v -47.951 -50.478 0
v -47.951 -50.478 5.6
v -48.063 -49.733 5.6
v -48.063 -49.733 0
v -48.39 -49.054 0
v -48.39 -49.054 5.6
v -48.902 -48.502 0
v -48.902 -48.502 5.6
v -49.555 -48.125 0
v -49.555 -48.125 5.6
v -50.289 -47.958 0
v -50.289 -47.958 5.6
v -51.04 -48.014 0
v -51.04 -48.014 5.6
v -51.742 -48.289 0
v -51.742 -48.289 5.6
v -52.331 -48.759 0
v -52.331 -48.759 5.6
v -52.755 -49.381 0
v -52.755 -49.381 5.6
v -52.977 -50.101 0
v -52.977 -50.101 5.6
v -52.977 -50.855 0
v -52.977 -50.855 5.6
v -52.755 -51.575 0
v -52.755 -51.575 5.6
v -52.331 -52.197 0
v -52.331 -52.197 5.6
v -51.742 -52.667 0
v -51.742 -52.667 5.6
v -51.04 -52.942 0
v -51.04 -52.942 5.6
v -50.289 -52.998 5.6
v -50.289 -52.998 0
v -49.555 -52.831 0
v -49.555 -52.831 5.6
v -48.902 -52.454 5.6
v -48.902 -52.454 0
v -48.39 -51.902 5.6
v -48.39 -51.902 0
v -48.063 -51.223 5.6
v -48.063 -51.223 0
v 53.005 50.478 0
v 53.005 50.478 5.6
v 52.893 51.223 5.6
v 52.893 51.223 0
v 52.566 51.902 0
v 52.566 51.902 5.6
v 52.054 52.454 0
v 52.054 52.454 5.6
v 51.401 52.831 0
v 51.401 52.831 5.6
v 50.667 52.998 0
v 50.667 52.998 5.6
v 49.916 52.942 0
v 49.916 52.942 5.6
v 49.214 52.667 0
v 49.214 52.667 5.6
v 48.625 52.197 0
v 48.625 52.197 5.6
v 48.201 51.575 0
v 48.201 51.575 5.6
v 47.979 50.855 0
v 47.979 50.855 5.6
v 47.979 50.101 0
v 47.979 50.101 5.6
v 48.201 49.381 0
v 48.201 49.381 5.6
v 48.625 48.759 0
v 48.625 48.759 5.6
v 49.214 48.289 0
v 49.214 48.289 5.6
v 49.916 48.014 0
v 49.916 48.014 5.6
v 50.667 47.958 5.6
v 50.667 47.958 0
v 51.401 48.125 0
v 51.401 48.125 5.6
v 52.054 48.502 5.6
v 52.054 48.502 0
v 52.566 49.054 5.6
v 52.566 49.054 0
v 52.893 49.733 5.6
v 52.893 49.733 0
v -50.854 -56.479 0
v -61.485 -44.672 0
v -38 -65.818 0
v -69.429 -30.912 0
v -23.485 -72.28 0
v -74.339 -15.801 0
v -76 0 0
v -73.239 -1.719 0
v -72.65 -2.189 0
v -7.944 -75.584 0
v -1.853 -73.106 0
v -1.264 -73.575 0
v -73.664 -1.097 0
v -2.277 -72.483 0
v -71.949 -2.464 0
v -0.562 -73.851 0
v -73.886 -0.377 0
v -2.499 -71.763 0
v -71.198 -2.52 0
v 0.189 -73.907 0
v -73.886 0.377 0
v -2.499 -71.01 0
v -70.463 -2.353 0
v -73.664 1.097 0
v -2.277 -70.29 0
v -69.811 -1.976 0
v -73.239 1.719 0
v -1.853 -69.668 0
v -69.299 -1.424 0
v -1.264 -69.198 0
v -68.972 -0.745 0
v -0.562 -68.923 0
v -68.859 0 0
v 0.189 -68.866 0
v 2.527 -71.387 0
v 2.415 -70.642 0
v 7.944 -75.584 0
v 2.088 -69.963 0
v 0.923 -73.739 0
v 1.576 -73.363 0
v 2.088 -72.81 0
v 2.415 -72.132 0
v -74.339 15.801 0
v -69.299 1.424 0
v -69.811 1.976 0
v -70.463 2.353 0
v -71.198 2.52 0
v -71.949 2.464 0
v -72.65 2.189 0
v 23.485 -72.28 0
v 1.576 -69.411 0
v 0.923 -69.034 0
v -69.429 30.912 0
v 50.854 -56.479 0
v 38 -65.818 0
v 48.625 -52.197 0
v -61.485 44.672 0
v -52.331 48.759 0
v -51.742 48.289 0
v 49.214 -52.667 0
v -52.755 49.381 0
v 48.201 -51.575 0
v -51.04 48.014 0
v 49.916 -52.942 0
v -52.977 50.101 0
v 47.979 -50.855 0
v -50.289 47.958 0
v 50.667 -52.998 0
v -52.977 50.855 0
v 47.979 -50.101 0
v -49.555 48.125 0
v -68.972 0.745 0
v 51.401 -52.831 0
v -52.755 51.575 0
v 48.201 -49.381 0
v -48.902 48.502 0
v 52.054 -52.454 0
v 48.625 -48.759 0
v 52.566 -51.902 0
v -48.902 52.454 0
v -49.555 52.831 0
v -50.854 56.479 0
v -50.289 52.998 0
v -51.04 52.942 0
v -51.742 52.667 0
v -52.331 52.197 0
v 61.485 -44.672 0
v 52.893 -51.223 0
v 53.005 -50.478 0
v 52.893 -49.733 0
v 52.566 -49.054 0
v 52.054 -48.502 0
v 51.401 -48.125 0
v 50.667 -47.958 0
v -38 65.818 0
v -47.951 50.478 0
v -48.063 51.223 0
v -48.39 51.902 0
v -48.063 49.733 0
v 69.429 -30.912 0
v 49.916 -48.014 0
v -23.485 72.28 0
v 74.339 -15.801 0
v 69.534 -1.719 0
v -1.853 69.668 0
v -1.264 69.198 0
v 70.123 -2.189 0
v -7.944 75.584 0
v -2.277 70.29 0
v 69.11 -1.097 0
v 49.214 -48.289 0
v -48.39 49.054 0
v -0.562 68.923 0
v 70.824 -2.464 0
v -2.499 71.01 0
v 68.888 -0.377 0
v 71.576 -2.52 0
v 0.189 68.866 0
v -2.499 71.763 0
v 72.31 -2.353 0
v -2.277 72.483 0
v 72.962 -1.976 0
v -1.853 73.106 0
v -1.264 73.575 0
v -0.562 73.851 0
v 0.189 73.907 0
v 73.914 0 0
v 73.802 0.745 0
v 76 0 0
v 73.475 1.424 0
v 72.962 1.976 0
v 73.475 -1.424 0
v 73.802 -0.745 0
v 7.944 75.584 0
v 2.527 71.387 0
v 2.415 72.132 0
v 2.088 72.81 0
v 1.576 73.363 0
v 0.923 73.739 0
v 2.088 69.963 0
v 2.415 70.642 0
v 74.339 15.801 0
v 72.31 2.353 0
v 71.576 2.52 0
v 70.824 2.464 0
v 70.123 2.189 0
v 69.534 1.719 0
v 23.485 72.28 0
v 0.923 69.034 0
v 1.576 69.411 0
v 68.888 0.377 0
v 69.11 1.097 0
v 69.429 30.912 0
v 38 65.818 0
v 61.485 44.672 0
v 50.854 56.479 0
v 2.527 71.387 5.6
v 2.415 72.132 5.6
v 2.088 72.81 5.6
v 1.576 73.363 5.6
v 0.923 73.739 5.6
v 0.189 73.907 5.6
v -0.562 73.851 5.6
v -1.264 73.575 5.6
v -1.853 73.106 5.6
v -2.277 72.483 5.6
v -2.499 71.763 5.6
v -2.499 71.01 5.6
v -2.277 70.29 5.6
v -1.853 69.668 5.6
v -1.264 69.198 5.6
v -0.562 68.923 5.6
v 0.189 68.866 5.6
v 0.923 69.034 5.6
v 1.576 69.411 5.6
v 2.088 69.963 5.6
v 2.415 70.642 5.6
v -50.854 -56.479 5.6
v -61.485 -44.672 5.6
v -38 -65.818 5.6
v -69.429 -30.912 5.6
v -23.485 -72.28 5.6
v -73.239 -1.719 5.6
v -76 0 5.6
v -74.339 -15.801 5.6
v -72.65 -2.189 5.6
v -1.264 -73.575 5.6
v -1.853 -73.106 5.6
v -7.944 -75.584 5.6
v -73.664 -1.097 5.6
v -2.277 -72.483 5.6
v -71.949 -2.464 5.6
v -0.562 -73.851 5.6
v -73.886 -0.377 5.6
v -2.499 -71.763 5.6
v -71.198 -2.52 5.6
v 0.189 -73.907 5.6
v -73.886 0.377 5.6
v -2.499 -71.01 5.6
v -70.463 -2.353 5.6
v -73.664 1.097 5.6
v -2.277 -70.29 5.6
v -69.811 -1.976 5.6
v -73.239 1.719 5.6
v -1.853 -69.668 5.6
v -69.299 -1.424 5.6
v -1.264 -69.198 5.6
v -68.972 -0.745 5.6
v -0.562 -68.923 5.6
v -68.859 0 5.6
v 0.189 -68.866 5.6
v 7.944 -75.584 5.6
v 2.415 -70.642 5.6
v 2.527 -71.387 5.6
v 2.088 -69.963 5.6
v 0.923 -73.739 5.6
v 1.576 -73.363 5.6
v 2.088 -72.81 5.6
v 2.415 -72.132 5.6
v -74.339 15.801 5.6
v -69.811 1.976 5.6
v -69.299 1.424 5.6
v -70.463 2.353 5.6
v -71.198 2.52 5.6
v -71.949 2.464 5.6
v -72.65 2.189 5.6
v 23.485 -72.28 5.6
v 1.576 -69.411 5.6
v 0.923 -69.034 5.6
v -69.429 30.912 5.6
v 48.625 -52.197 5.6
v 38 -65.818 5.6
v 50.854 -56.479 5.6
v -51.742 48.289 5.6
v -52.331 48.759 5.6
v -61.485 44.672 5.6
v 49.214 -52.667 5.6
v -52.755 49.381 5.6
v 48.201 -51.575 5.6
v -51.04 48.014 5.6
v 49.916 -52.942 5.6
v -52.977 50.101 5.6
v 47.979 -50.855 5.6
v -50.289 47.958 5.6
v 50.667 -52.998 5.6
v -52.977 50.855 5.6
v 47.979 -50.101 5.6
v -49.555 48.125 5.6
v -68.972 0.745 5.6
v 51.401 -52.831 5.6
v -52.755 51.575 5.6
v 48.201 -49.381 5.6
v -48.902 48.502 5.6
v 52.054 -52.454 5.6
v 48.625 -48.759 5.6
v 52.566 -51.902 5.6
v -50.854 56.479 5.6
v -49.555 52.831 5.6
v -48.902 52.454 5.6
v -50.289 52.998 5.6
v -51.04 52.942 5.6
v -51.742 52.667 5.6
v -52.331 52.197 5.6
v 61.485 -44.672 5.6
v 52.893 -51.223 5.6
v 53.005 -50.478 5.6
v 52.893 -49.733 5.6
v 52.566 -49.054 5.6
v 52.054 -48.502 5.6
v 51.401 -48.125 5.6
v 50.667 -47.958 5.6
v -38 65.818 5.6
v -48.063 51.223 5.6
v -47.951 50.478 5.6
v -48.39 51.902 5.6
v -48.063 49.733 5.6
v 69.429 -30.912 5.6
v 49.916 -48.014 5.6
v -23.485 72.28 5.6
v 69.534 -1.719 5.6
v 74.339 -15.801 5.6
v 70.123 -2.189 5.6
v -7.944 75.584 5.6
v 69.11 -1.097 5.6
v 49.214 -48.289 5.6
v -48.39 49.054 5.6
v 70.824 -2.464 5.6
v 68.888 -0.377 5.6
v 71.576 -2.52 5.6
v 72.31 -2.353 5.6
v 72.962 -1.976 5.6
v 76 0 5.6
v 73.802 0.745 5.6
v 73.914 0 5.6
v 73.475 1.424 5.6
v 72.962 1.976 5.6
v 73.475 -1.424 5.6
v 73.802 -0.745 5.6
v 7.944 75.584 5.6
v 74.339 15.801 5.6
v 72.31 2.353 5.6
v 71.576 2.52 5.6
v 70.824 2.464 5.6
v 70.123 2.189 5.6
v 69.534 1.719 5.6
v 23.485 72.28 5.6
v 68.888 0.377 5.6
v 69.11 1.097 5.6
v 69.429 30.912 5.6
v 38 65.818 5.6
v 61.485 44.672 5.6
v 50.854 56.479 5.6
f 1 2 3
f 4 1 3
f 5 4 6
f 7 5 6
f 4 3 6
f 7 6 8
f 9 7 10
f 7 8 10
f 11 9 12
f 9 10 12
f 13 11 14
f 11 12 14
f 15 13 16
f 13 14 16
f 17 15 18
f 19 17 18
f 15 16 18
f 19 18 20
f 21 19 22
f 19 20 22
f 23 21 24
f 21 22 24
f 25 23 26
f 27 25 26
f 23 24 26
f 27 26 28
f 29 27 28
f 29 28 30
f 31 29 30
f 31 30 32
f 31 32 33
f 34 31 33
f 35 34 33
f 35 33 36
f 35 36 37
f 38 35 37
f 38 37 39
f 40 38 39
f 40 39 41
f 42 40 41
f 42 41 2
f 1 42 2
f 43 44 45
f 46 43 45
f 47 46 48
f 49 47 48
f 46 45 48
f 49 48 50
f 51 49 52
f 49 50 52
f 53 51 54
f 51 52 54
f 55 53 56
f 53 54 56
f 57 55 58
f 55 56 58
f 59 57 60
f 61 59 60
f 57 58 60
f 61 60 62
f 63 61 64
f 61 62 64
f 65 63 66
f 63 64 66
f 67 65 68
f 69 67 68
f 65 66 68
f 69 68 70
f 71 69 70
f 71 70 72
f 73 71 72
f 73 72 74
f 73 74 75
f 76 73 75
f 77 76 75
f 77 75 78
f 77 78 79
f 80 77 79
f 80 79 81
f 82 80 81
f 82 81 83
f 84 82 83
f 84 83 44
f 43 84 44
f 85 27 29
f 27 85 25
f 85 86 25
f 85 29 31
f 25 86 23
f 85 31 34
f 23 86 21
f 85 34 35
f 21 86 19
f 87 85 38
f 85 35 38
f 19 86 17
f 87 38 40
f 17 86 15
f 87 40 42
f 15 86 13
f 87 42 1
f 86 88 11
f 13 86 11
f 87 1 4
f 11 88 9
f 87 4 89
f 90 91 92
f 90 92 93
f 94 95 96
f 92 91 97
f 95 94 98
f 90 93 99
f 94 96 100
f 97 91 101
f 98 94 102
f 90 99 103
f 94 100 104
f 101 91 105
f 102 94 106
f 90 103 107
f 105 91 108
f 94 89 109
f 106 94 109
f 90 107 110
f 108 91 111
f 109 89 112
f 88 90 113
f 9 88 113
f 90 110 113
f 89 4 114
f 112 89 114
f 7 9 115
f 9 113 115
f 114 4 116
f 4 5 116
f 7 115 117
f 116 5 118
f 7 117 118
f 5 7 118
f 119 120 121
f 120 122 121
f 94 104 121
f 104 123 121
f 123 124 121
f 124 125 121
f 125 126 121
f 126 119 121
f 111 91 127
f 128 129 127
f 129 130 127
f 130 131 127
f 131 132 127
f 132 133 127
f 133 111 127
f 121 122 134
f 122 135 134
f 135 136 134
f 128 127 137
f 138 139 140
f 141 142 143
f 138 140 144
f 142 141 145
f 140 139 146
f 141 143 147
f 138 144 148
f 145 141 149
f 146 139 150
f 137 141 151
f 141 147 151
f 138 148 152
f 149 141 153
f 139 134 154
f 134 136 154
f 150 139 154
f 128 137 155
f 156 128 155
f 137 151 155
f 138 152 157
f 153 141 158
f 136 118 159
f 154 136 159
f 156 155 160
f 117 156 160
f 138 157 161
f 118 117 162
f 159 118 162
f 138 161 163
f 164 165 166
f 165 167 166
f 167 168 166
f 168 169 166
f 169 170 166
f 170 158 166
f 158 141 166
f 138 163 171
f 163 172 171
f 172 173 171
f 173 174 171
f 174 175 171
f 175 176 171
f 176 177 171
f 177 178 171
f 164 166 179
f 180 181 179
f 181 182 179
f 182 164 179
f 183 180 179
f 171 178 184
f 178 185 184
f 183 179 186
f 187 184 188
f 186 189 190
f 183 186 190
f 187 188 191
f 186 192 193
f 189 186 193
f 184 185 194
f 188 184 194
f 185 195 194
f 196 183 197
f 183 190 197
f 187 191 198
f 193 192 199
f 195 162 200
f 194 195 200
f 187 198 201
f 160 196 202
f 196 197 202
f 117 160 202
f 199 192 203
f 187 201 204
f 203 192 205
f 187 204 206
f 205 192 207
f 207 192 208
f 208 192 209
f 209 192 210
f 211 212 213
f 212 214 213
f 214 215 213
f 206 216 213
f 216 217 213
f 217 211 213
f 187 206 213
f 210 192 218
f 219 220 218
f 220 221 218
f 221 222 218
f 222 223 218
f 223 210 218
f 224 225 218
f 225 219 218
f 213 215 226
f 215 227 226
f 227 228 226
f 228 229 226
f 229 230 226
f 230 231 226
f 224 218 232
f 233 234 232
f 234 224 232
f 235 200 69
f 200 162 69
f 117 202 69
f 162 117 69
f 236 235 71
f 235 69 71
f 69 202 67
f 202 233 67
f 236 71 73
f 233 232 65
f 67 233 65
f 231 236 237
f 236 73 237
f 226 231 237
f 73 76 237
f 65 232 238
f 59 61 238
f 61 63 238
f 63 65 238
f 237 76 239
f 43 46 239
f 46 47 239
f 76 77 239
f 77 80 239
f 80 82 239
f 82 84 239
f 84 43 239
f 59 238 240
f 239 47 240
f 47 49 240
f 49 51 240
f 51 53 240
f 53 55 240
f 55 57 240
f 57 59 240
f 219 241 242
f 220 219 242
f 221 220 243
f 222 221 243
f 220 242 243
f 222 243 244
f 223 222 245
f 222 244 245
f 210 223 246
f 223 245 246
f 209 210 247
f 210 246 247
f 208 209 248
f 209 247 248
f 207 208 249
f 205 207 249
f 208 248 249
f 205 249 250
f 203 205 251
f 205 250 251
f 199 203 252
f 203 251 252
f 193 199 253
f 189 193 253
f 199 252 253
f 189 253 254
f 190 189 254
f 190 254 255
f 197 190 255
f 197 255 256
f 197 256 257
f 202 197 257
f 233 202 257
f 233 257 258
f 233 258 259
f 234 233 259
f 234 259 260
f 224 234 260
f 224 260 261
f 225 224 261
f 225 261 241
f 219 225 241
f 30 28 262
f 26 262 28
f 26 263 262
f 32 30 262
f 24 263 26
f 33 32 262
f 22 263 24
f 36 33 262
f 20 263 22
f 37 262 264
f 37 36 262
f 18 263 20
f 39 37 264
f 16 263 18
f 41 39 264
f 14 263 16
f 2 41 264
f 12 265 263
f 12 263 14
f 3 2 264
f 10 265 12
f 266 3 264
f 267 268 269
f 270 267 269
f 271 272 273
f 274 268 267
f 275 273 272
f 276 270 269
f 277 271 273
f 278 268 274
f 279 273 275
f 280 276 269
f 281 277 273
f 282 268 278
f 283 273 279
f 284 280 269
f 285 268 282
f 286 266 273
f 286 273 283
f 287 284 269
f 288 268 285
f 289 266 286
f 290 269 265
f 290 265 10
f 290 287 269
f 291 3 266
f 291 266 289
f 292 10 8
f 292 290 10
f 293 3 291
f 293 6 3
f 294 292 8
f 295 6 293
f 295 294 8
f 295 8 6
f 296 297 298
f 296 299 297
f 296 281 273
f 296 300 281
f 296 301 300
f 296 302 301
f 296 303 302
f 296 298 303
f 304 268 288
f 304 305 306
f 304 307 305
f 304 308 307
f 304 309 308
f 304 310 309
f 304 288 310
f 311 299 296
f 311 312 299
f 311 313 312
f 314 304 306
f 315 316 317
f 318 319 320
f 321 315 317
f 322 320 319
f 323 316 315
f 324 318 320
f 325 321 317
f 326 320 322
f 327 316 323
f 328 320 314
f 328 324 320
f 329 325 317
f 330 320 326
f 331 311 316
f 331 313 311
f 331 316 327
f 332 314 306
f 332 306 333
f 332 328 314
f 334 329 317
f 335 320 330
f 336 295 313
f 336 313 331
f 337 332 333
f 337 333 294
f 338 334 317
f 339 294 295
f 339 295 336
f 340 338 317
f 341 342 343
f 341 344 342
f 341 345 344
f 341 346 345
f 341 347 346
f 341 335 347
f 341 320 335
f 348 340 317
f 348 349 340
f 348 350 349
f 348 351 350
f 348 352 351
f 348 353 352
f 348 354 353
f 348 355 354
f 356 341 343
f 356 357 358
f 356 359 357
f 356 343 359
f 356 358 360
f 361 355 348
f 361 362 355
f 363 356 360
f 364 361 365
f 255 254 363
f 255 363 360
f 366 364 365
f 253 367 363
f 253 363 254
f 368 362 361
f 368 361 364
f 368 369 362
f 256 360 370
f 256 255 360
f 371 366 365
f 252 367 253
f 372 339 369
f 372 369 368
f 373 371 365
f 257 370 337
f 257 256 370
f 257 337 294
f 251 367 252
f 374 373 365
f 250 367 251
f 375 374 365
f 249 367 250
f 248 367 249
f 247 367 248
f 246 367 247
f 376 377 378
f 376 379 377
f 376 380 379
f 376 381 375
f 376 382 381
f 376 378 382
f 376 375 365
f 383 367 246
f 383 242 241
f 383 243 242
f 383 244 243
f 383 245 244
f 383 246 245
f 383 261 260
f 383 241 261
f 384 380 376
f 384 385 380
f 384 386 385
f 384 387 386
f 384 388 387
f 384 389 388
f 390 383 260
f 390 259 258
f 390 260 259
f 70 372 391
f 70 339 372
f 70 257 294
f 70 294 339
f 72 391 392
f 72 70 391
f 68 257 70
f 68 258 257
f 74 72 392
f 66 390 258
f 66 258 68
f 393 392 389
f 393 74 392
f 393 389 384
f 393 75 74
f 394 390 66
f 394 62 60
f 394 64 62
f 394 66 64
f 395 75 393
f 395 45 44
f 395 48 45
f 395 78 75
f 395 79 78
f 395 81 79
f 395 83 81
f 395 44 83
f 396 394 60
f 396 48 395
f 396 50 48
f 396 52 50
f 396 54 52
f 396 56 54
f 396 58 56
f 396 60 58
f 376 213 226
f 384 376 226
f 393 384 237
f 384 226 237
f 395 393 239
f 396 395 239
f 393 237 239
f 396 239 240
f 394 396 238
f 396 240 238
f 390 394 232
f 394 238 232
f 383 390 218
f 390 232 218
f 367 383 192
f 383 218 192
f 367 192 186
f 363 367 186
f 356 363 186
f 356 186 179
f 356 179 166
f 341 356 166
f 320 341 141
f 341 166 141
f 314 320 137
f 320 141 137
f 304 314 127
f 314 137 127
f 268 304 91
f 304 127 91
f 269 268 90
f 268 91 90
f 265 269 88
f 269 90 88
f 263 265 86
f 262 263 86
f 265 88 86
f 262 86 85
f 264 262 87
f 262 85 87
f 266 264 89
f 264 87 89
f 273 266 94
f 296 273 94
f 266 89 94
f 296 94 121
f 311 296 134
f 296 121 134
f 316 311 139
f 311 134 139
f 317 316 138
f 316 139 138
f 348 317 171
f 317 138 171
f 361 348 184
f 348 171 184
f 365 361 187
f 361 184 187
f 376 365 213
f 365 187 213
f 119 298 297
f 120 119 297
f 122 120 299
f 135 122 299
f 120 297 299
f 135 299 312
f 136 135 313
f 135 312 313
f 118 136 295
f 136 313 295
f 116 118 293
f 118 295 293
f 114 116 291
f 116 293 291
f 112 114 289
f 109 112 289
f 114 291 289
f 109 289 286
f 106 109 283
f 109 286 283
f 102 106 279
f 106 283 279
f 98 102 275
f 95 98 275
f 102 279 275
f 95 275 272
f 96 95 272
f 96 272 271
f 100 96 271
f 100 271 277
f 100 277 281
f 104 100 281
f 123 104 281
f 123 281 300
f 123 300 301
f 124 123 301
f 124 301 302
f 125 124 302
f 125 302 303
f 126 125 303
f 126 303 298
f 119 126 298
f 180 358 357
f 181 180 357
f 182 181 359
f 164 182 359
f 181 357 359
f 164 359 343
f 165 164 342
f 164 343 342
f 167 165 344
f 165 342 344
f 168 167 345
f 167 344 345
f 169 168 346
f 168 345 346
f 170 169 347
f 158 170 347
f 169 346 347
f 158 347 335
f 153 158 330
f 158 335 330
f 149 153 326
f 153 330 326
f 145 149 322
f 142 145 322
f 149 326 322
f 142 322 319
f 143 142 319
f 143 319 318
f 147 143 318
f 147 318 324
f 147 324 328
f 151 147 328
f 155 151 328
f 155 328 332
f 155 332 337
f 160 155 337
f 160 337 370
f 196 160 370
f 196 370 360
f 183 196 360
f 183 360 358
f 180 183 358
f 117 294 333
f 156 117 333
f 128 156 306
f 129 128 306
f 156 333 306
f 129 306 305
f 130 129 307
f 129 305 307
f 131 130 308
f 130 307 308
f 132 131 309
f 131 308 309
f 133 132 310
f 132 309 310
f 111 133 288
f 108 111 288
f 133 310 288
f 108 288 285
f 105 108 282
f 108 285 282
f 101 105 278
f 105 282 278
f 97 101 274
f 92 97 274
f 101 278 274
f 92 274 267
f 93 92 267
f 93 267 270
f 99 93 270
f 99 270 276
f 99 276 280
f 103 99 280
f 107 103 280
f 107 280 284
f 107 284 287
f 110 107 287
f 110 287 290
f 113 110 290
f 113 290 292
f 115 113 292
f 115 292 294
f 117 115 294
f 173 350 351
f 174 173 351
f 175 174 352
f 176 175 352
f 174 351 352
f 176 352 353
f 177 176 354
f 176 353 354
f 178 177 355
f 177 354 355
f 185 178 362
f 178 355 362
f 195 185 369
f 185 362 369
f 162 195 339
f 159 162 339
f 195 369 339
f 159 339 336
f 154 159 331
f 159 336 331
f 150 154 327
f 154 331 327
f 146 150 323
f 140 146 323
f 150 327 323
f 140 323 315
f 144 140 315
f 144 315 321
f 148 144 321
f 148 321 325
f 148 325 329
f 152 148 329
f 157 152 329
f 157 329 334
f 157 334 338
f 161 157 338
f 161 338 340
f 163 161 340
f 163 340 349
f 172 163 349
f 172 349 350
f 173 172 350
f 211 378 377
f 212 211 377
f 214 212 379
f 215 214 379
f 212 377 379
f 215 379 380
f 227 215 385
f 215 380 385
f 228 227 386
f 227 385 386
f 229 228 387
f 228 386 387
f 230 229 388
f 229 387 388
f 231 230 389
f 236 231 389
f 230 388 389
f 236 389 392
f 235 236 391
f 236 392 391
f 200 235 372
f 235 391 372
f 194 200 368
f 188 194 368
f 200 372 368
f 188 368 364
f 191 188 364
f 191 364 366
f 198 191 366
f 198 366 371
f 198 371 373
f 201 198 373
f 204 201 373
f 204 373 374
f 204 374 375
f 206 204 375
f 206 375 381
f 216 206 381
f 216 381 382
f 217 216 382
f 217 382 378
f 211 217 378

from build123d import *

# Parameters (mm, degrees)
SKETCH1_R                      = 76
BOSS_EXTRUDE1_DEPTH            = 5.6
F_8_0_199_DIAMETER_HOLE1_D     = 5.0546
F_8_0_199_DIAMETER_HOLE1_DEPTH = 8.481444958
F_8_0_199_DIAMETER_HOLE1_TIP   = 1.518555042


with BuildPart() as part:
    # Sketch1 → Boss-Extrude1 (new body)
    with BuildSketch(Plane.XY):
        Circle(SKETCH1_R)
    extrude(amount=BOSS_EXTRUDE1_DEPTH)

    # #8 (0.199) Diameter Hole1
    with Locations(Plane(origin=(0, 0, 0), x_dir=(-1, 0, 0), z_dir=(0, 0, -1))):
        with Locations((-50.478019657, 50.478019657), (0, 71.3867), (50.478019657, 50.478019657), (71.3867, 0), (50.478019657, -50.478019657), (0, -71.3867), (-50.478019657, -50.478019657), (-71.3867, 0)):
            Hole(F_8_0_199_DIAMETER_HOLE1_D / 2, depth=F_8_0_199_DIAMETER_HOLE1_DEPTH)
            with Locations((0, 0, -(F_8_0_199_DIAMETER_HOLE1_DEPTH + F_8_0_199_DIAMETER_HOLE1_TIP / 2))):  # 118° drill point
                Cone(0, F_8_0_199_DIAMETER_HOLE1_D / 2, F_8_0_199_DIAMETER_HOLE1_TIP, mode=Mode.SUBTRACT)


solid = part.part
